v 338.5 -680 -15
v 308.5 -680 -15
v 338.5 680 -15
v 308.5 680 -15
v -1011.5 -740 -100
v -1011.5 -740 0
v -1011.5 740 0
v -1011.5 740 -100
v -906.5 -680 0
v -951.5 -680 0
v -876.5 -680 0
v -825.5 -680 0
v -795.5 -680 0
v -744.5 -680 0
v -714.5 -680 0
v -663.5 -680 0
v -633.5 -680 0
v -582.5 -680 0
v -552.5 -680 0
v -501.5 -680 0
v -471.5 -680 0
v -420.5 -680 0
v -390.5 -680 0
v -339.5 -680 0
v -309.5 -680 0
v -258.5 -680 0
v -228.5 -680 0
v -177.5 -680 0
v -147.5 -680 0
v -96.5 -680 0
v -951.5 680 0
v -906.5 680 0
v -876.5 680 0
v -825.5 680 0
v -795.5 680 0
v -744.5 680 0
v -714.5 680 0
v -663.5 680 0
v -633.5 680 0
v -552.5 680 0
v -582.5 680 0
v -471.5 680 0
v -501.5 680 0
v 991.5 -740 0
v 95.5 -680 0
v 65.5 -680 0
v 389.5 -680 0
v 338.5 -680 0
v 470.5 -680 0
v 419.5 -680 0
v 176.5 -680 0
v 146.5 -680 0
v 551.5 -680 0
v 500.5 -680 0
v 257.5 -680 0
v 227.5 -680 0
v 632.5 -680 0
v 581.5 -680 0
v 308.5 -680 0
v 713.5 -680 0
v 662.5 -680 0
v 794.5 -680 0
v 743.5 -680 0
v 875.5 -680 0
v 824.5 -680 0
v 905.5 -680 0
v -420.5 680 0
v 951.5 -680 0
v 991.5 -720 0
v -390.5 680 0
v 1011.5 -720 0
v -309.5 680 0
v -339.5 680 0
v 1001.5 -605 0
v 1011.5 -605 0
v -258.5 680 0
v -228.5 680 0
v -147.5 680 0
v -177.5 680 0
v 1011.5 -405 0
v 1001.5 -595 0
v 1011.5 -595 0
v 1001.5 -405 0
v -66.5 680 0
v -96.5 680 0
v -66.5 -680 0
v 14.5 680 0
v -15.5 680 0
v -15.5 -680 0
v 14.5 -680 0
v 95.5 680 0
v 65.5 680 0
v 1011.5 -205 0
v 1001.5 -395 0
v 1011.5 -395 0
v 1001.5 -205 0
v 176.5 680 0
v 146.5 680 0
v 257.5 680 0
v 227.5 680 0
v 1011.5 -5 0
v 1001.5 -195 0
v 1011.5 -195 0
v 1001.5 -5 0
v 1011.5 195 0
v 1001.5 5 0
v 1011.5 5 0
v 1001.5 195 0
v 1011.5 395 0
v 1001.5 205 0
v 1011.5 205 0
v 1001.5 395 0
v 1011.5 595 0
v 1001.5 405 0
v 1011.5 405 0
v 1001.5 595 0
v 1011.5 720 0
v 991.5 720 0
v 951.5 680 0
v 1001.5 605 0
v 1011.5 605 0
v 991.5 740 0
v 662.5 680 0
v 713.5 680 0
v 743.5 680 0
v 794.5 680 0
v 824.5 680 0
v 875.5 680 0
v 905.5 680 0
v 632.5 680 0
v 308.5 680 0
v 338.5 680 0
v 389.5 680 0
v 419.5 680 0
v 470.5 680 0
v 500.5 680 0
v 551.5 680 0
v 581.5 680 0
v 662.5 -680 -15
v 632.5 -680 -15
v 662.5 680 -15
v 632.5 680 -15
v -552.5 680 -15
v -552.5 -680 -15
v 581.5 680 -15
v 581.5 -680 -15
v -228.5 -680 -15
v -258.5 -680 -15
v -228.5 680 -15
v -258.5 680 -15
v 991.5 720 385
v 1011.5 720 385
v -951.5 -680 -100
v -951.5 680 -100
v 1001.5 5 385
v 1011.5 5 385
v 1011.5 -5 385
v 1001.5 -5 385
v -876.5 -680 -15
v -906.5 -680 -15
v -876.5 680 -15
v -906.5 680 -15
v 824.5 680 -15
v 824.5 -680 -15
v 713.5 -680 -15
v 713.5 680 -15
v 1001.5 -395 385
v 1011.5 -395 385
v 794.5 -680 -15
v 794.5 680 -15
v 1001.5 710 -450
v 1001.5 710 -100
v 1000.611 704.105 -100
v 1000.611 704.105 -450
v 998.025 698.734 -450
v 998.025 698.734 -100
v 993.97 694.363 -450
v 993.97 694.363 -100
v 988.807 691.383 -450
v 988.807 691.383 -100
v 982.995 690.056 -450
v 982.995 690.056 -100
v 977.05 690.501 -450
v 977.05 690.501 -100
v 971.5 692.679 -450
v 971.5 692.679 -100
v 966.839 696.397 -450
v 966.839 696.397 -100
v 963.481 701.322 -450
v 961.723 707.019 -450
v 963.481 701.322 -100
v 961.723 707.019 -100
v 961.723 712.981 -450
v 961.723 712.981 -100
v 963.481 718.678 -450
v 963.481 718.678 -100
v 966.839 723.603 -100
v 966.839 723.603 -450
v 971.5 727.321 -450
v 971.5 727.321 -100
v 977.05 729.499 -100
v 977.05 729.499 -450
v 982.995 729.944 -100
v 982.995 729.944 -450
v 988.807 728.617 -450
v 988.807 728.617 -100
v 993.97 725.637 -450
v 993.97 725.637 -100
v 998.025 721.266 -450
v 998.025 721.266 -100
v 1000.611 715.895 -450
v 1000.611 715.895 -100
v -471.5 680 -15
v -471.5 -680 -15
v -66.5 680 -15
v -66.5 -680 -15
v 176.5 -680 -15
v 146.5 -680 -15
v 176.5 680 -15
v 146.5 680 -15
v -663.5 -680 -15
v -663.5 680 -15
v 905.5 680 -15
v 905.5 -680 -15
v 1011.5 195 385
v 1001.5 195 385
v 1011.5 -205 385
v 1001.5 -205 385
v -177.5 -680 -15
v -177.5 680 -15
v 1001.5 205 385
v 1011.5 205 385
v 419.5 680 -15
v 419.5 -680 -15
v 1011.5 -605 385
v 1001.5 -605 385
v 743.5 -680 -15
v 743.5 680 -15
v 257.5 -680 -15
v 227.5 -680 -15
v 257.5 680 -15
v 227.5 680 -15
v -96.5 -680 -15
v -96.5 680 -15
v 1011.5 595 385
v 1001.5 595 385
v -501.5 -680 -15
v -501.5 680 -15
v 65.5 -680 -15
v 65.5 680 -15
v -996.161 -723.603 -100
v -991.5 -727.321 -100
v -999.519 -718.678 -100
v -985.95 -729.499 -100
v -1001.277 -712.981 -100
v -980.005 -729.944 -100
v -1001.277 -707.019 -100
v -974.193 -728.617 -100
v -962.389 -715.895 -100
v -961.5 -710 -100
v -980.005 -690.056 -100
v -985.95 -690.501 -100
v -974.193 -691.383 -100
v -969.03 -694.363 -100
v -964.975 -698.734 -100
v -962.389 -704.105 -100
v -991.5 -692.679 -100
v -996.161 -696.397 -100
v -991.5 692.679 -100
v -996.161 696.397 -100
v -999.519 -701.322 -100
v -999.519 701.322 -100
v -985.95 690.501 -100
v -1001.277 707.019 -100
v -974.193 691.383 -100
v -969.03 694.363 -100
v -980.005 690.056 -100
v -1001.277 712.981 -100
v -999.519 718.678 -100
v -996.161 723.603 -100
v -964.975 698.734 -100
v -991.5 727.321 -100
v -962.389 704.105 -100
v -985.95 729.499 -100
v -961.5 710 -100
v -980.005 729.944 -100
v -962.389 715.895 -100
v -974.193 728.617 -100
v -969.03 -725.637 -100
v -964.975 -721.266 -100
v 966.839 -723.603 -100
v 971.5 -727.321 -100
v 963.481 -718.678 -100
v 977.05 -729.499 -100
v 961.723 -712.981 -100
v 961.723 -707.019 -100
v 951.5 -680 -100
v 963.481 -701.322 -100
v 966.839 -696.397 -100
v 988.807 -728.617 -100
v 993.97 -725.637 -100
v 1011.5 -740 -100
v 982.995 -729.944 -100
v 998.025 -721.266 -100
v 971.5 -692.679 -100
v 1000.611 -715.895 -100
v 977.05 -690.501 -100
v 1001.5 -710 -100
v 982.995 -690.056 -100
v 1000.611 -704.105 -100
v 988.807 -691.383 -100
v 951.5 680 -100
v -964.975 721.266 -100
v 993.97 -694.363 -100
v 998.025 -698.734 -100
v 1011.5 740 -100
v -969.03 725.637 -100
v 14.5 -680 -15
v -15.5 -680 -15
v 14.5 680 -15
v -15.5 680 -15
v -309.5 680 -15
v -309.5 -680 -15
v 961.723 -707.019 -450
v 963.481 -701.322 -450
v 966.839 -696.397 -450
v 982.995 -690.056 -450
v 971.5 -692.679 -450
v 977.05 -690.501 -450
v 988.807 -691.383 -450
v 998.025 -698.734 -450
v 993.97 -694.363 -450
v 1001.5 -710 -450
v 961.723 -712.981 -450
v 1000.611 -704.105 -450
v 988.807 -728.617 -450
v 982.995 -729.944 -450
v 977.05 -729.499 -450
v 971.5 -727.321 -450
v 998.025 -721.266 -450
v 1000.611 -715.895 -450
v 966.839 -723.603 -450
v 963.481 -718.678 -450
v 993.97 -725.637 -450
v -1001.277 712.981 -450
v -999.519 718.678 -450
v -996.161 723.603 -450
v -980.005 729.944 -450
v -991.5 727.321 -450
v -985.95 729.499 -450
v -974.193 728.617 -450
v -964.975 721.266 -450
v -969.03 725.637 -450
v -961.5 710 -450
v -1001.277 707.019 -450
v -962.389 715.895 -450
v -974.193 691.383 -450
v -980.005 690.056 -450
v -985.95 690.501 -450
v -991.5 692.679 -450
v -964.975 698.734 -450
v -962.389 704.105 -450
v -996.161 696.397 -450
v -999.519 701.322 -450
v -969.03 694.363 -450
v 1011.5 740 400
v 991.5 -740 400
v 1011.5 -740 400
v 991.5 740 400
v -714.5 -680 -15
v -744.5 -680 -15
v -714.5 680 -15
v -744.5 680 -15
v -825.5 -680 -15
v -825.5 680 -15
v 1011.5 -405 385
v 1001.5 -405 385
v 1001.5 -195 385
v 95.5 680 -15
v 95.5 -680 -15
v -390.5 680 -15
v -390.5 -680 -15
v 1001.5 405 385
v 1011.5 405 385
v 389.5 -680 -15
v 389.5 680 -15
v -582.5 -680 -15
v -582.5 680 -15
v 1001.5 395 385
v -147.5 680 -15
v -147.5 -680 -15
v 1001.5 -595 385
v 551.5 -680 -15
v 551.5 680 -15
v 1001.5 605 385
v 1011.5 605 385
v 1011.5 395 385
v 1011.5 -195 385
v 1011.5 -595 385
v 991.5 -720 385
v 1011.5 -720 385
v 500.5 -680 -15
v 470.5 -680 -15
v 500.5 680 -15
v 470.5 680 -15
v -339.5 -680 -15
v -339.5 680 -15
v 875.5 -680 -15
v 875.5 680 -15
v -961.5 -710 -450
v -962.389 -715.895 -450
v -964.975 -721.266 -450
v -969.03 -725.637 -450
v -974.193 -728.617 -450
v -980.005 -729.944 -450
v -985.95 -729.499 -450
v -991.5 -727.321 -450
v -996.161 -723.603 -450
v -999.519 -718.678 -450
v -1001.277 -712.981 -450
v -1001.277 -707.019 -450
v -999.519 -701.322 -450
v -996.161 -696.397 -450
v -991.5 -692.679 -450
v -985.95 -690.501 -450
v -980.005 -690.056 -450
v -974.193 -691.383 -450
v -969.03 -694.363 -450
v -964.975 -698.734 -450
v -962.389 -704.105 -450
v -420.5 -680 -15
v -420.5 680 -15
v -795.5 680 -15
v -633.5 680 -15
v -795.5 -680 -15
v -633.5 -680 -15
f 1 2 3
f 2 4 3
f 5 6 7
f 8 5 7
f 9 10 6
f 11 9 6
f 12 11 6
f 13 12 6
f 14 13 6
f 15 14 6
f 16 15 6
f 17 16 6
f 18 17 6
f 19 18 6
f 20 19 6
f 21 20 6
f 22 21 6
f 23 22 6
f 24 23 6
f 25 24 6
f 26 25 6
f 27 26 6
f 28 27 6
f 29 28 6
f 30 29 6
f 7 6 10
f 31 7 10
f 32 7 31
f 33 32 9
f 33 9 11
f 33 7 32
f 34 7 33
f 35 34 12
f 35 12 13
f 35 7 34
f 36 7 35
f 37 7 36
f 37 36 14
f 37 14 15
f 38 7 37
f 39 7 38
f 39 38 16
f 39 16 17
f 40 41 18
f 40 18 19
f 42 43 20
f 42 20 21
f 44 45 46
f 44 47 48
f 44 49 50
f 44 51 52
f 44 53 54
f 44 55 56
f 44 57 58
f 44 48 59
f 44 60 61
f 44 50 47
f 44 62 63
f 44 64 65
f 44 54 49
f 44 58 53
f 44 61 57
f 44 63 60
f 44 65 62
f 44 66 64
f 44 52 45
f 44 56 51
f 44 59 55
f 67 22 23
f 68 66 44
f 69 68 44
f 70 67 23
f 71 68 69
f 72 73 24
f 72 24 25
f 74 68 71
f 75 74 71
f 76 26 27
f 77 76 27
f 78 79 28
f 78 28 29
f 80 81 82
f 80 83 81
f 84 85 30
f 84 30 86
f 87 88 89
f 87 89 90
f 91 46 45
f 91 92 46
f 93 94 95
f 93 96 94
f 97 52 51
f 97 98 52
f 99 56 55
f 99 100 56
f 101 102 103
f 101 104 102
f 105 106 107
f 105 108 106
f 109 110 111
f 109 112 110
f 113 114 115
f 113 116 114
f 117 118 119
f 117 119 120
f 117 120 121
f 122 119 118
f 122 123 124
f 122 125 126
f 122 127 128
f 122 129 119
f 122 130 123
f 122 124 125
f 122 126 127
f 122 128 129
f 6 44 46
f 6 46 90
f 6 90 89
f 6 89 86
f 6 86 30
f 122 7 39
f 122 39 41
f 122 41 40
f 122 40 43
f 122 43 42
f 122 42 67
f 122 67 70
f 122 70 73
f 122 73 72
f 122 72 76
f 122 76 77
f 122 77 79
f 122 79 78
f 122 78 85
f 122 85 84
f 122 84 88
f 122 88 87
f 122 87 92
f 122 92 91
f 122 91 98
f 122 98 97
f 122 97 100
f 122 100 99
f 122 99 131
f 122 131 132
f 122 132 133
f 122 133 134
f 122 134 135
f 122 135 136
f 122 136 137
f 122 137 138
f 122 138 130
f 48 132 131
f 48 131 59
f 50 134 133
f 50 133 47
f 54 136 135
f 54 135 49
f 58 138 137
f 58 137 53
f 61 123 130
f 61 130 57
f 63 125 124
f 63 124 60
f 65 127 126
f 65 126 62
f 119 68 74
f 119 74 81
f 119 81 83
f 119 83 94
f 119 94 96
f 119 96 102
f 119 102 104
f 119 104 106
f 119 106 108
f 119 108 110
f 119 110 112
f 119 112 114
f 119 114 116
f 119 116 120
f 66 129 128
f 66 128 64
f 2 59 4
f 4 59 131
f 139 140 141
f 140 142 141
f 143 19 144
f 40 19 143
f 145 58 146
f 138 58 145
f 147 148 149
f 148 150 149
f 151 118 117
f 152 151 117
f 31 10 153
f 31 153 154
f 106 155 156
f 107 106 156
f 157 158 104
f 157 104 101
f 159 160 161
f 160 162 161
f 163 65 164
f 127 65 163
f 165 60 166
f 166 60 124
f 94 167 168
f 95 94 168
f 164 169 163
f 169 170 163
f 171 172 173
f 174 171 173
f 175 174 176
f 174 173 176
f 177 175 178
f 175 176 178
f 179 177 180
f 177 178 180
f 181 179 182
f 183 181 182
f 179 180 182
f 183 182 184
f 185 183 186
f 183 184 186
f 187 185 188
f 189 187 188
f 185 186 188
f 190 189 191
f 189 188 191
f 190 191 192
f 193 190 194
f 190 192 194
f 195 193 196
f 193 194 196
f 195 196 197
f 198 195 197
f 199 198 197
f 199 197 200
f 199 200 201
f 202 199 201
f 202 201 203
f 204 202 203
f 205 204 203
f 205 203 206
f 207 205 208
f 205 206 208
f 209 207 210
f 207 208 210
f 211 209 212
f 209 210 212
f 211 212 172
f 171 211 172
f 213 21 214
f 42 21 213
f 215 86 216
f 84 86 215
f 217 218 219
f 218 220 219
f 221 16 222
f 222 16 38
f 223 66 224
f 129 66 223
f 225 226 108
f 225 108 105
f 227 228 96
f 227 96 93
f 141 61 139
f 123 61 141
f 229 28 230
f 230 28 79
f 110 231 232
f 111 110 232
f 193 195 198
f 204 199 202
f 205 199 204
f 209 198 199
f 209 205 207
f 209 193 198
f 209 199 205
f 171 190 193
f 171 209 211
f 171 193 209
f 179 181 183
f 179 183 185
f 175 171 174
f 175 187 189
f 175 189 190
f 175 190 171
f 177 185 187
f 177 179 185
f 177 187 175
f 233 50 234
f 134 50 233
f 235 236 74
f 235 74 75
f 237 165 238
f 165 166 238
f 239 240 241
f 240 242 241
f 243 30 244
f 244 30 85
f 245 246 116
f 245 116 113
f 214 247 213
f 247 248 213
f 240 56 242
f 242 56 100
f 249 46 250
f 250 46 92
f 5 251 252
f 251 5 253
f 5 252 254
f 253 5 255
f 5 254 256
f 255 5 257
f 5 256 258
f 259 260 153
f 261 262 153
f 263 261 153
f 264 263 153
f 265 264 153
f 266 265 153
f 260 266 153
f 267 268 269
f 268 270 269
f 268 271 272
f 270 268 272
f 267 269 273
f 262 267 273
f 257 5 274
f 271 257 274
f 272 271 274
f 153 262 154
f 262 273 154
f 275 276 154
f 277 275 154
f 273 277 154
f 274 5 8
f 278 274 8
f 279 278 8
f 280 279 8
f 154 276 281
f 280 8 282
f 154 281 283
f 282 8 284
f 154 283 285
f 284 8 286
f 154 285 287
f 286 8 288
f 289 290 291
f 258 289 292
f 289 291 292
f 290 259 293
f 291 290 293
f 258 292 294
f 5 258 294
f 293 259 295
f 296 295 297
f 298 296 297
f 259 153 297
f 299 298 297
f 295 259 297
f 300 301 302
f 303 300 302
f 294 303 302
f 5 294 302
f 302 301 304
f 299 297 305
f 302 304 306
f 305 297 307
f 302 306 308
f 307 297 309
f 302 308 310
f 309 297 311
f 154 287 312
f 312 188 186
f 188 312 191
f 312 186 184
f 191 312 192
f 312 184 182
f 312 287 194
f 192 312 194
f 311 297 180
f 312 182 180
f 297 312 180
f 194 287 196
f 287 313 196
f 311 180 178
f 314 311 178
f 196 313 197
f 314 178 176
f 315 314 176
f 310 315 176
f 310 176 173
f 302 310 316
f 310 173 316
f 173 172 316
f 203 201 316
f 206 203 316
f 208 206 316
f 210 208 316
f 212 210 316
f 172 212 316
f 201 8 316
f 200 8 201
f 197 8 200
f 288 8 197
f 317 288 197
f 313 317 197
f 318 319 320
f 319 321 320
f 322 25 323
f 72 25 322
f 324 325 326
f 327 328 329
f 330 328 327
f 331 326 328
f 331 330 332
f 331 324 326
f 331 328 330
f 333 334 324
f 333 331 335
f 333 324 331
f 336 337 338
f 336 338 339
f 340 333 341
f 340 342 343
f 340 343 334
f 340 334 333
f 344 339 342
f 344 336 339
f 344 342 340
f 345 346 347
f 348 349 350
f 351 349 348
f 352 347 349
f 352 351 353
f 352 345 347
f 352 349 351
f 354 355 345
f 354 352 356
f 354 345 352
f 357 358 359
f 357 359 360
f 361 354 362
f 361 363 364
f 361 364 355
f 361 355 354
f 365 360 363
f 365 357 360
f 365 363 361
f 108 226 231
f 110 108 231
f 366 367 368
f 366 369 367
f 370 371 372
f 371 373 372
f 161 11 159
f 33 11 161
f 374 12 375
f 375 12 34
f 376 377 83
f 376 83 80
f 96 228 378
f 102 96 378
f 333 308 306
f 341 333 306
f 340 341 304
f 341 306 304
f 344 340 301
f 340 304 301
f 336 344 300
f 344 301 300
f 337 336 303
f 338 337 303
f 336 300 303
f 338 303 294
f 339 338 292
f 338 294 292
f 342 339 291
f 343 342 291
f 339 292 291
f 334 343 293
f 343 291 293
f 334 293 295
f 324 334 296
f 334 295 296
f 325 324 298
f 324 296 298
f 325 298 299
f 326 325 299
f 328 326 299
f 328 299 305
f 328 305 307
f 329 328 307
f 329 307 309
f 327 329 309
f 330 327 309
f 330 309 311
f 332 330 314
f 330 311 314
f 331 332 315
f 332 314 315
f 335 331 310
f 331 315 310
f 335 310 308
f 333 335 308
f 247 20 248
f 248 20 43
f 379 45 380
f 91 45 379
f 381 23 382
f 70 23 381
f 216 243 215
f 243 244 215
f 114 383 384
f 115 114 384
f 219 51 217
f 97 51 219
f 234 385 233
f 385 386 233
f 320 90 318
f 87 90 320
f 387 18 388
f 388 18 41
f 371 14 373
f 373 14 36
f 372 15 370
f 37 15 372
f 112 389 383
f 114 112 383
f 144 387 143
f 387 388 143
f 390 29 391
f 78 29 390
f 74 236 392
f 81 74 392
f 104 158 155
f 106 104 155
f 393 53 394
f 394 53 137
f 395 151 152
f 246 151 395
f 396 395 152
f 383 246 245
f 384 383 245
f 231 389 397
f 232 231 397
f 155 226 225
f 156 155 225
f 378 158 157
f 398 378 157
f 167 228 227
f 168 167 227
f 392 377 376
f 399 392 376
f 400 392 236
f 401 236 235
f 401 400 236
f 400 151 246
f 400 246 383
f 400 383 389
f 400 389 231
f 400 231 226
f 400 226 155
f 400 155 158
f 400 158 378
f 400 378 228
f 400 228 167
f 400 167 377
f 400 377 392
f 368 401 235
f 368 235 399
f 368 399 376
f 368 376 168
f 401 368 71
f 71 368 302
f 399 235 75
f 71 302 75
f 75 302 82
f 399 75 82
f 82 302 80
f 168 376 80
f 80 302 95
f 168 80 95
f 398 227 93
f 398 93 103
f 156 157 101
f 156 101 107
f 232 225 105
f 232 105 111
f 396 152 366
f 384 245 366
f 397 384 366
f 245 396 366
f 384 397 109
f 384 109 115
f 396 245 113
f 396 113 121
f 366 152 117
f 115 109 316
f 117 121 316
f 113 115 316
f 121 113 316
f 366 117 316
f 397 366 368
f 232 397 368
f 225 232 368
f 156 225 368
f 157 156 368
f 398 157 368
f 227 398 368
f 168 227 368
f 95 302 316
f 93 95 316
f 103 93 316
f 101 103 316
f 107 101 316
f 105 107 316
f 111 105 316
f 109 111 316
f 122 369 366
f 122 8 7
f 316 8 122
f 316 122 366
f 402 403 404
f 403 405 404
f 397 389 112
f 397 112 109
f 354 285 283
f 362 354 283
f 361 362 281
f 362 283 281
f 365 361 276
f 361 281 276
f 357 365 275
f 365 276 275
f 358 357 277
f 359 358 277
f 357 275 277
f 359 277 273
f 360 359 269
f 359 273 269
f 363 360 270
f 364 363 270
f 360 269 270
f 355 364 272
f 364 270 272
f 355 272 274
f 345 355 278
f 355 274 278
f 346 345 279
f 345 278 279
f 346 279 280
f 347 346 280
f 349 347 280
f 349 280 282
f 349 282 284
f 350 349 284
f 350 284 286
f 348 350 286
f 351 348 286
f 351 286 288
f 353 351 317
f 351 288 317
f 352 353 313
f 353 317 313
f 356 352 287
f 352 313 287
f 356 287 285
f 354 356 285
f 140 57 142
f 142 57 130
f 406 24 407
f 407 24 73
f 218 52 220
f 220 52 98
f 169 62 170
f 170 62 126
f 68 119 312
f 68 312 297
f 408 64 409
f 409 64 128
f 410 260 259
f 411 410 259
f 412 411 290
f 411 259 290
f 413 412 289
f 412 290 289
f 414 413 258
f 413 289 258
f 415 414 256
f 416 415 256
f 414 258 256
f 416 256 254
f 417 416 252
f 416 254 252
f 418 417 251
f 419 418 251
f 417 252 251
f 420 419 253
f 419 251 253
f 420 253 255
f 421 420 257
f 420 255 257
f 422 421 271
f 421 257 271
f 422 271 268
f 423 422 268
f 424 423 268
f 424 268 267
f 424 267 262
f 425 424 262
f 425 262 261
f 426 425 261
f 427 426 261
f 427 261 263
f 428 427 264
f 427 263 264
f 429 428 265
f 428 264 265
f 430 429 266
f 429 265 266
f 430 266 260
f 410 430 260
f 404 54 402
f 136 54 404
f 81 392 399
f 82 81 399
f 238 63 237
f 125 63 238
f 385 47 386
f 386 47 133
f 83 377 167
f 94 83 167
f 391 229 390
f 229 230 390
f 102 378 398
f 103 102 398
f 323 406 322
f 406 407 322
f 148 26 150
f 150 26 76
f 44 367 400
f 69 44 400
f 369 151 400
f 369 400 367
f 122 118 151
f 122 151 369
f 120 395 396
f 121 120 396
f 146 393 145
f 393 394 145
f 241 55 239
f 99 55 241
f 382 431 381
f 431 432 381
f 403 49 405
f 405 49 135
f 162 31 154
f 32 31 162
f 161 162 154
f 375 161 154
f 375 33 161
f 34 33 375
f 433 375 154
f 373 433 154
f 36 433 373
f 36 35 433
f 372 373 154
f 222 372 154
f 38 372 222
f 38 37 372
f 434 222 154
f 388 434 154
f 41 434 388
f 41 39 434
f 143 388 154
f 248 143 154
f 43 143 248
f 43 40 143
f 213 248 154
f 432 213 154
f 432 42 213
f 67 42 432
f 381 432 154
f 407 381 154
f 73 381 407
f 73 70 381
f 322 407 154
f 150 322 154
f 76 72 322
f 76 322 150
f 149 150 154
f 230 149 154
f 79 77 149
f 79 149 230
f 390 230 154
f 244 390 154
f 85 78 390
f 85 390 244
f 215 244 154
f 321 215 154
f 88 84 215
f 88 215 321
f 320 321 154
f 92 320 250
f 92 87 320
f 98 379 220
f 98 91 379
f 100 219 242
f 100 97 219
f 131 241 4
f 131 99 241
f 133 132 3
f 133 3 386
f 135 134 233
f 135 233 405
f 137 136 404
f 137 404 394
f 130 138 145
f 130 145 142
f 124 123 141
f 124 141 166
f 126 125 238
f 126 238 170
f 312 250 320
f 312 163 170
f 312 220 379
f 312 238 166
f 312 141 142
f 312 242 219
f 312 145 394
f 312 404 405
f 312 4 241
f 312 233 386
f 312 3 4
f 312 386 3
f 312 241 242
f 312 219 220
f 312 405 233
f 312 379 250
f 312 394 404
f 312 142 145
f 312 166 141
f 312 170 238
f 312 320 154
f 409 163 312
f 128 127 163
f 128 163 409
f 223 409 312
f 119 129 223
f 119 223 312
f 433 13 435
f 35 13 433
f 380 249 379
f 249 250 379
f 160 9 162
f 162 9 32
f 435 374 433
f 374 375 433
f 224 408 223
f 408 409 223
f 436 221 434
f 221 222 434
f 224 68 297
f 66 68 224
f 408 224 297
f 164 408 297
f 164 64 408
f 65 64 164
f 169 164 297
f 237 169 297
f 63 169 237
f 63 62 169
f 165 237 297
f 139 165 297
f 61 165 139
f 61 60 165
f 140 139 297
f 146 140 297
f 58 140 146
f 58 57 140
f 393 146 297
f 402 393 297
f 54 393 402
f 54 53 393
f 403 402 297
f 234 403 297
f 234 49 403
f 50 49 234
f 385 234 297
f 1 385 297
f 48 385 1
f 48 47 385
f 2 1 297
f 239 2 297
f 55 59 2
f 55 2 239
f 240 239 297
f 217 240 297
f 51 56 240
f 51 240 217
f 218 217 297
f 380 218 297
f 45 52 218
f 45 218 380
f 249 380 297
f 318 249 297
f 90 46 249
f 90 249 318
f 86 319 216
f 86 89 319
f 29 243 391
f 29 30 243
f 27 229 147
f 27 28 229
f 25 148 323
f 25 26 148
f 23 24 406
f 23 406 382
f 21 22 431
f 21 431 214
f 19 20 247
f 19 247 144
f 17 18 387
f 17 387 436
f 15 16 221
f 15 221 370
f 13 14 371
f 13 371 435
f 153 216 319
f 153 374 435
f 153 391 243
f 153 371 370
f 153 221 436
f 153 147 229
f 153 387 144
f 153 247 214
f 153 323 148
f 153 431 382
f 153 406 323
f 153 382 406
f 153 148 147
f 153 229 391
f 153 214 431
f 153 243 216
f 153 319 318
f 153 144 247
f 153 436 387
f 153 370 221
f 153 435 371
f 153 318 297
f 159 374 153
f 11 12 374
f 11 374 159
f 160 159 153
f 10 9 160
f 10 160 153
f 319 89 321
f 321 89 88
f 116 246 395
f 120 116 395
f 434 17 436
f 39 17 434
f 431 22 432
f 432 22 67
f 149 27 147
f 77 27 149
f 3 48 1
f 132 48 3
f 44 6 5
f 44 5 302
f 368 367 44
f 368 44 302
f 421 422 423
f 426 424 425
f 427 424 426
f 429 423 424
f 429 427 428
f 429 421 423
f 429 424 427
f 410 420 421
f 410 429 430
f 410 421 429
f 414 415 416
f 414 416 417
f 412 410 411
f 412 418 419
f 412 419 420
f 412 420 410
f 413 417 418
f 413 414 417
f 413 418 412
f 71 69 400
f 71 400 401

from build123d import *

# Parameters (mm, degrees)
F0_W     = 2023
F0_H     = 1480
F0_W_2   = 30
F0_H_2   = 1360
F1_DEPTH = 15
F2_DEPTH = 100
F3_R     = 20
F4_DEPTH = 350
F5_W     = 20
F5_H     = 20
F5_W_2   = 10
F5_H_2   = 10
F6_DEPTH = 400
F7_W     = 20
F7_H     = 15
F8_DEPTH = 1480


with BuildPart() as f1:
    # F0 (on Top) → F1 (new body)
    with BuildSketch(Plane.XY):
        Rectangle(F0_W, F0_H)
        Polygon((-951.5, -680), (-951.5, 680), (-906.5, 680), (-876.5, 680), (-825.5, 680), (-795.5, 680), (-744.5, 680), (-714.5, 680), (-663.5, 680), (-633.5, 680), (-582.5, 680), (-552.5, 680), (-501.5, 680), (-471.5, 680), (-420.5, 680), (-390.5, 680), (-339.5, 680), (-309.5, 680), (-258.5, 680), (-228.5, 680), (-177.5, 680), (-147.5, 680), (-96.5, 680), (-66.5, 680), (-15.5, 680), (14.5, 680), (65.5, 680), (95.5, 680), (146.5, 680), (176.5, 680), (227.5, 680), (257.5, 680), (308.5, 680), (338.5, 680), (389.5, 680), (419.5, 680), (470.5, 680), (500.5, 680), (551.5, 680), (581.5, 680), (632.5, 680), (662.5, 680), (713.5, 680), (743.5, 680), (794.5, 680), (824.5, 680), (875.5, 680), (905.5, 680), (951.5, 680), (951.5, -680), (905.5, -680), (875.5, -680), (824.5, -680), (794.5, -680), (743.5, -680), (713.5, -680), (662.5, -680), (632.5, -680), (581.5, -680), (551.5, -680), (500.5, -680), (470.5, -680), (419.5, -680), (389.5, -680), (338.5, -680), (308.5, -680), (257.5, -680), (227.5, -680), (176.5, -680), (146.5, -680), (95.5, -680), (65.5, -680), (14.5, -680), (-15.5, -680), (-66.5, -680), (-96.5, -680), (-147.5, -680), (-177.5, -680), (-228.5, -680), (-258.5, -680), (-309.5, -680), (-339.5, -680), (-390.5, -680), (-420.5, -680), (-471.5, -680), (-501.5, -680), (-552.5, -680), (-582.5, -680), (-633.5, -680), (-663.5, -680), (-714.5, -680), (-744.5, -680), (-795.5, -680), (-825.5, -680), (-876.5, -680), (-906.5, -680), align=None, mode=Mode.SUBTRACT)
        with Locations((-891.5, 0)):
            Rectangle(F0_W_2, F0_H_2)
        with Locations((-810.5, 0)):
            Rectangle(F0_W_2, F0_H_2)
        with Locations((-729.5, 0)):
            Rectangle(F0_W_2, F0_H_2)
        with Locations((-648.5, 0)):
            Rectangle(F0_W_2, F0_H_2)
        with Locations((-567.5, 0)):
            Rectangle(F0_W_2, F0_H_2)
        with Locations((-486.5, 0)):
            Rectangle(F0_W_2, F0_H_2)
        with Locations((-405.5, 0)):
            Rectangle(F0_W_2, F0_H_2)
        with Locations((-324.5, 0)):
            Rectangle(F0_W_2, F0_H_2)
        with Locations((-243.5, 0)):
            Rectangle(F0_W_2, F0_H_2)
        with Locations((-162.5, 0)):
            Rectangle(F0_W_2, F0_H_2)
        with Locations((-81.5, 0)):
            Rectangle(F0_W_2, F0_H_2)
        with Locations((-0.5, 0)):
            Rectangle(F0_W_2, F0_H_2)
        with Locations((80.5, 0)):
            Rectangle(F0_W_2, F0_H_2)
        with Locations((161.5, 0)):
            Rectangle(F0_W_2, F0_H_2)
        with Locations((242.5, 0)):
            Rectangle(F0_W_2, F0_H_2)
        with Locations((323.5, 0)):
            Rectangle(F0_W_2, F0_H_2)
        with Locations((404.5, 0)):
            Rectangle(F0_W_2, F0_H_2)
        with Locations((485.5, 0)):
            Rectangle(F0_W_2, F0_H_2)
        with Locations((566.5, 0)):
            Rectangle(F0_W_2, F0_H_2)
        with Locations((647.5, 0)):
            Rectangle(F0_W_2, F0_H_2)
        with Locations((728.5, 0)):
            Rectangle(F0_W_2, F0_H_2)
        with Locations((809.5, 0)):
            Rectangle(F0_W_2, F0_H_2)
        with Locations((890.5, 0)):
            Rectangle(F0_W_2, F0_H_2)
    extrude(amount=-F1_DEPTH)

    # F0 (on Top) → F2 (join)
    with BuildSketch(Plane.XY):
        Rectangle(F0_W, F0_H)
        Polygon((-951.5, -680), (-951.5, 680), (-906.5, 680), (-876.5, 680), (-825.5, 680), (-795.5, 680), (-744.5, 680), (-714.5, 680), (-663.5, 680), (-633.5, 680), (-582.5, 680), (-552.5, 680), (-501.5, 680), (-471.5, 680), (-420.5, 680), (-390.5, 680), (-339.5, 680), (-309.5, 680), (-258.5, 680), (-228.5, 680), (-177.5, 680), (-147.5, 680), (-96.5, 680), (-66.5, 680), (-15.5, 680), (14.5, 680), (65.5, 680), (95.5, 680), (146.5, 680), (176.5, 680), (227.5, 680), (257.5, 680), (308.5, 680), (338.5, 680), (389.5, 680), (419.5, 680), (470.5, 680), (500.5, 680), (551.5, 680), (581.5, 680), (632.5, 680), (662.5, 680), (713.5, 680), (743.5, 680), (794.5, 680), (824.5, 680), (875.5, 680), (905.5, 680), (951.5, 680), (951.5, -680), (905.5, -680), (875.5, -680), (824.5, -680), (794.5, -680), (743.5, -680), (713.5, -680), (662.5, -680), (632.5, -680), (581.5, -680), (551.5, -680), (500.5, -680), (470.5, -680), (419.5, -680), (389.5, -680), (338.5, -680), (308.5, -680), (257.5, -680), (227.5, -680), (176.5, -680), (146.5, -680), (95.5, -680), (65.5, -680), (14.5, -680), (-15.5, -680), (-66.5, -680), (-96.5, -680), (-147.5, -680), (-177.5, -680), (-228.5, -680), (-258.5, -680), (-309.5, -680), (-339.5, -680), (-390.5, -680), (-420.5, -680), (-471.5, -680), (-501.5, -680), (-552.5, -680), (-582.5, -680), (-633.5, -680), (-663.5, -680), (-714.5, -680), (-744.5, -680), (-795.5, -680), (-825.5, -680), (-876.5, -680), (-906.5, -680), align=None, mode=Mode.SUBTRACT)
    extrude(amount=-F2_DEPTH)

    # F3 (on face) → F4 (join)
    with BuildSketch(Plane(origin=(0, 0, -100), x_dir=(1, 0, 0), z_dir=(0, 0, -1))):
        with Locations((-981.5, 710)):
            Circle(F3_R)
        with Locations((981.5, 710)):
            Circle(F3_R)
        with Locations((981.5, -710)):
            Circle(F3_R)
        with Locations((-981.5, -710)):
            Circle(F3_R)
    extrude(amount=F4_DEPTH)

    # F5 (on face) → F6 (join)
    with BuildSketch(Plane.XY):
        with Locations((1001.5, 730)):
            Rectangle(F5_W, F5_H)
        with Locations((1001.5, -730)):
            Rectangle(F5_W, F5_H)
        with Locations((1006.5, -600)):
            Rectangle(F5_W_2, F5_H_2)
        with Locations((1006.5, -400)):
            Rectangle(F5_W_2, F5_H_2)
        with Locations((1006.5, -200)):
            Rectangle(F5_W_2, F5_H_2)
        with Locations((1006.5, 0)):
            Rectangle(F5_W_2, F5_H_2)
        with Locations((1006.5, 200)):
            Rectangle(F5_W_2, F5_H_2)
        with Locations((1006.5, 400)):
            Rectangle(F5_W_2, F5_H_2)
        with Locations((1006.5, 600)):
            Rectangle(F5_W_2, F5_H_2)
    extrude(amount=F6_DEPTH)

    # F7 (on face) → F8 (join, through all)
    with BuildSketch(Plane.XZ.offset(740)):
        with Locations((1001.5, 392.5)):
            Rectangle(F7_W, F7_H)
    extrude(amount=-F8_DEPTH)


solid = f1.part
